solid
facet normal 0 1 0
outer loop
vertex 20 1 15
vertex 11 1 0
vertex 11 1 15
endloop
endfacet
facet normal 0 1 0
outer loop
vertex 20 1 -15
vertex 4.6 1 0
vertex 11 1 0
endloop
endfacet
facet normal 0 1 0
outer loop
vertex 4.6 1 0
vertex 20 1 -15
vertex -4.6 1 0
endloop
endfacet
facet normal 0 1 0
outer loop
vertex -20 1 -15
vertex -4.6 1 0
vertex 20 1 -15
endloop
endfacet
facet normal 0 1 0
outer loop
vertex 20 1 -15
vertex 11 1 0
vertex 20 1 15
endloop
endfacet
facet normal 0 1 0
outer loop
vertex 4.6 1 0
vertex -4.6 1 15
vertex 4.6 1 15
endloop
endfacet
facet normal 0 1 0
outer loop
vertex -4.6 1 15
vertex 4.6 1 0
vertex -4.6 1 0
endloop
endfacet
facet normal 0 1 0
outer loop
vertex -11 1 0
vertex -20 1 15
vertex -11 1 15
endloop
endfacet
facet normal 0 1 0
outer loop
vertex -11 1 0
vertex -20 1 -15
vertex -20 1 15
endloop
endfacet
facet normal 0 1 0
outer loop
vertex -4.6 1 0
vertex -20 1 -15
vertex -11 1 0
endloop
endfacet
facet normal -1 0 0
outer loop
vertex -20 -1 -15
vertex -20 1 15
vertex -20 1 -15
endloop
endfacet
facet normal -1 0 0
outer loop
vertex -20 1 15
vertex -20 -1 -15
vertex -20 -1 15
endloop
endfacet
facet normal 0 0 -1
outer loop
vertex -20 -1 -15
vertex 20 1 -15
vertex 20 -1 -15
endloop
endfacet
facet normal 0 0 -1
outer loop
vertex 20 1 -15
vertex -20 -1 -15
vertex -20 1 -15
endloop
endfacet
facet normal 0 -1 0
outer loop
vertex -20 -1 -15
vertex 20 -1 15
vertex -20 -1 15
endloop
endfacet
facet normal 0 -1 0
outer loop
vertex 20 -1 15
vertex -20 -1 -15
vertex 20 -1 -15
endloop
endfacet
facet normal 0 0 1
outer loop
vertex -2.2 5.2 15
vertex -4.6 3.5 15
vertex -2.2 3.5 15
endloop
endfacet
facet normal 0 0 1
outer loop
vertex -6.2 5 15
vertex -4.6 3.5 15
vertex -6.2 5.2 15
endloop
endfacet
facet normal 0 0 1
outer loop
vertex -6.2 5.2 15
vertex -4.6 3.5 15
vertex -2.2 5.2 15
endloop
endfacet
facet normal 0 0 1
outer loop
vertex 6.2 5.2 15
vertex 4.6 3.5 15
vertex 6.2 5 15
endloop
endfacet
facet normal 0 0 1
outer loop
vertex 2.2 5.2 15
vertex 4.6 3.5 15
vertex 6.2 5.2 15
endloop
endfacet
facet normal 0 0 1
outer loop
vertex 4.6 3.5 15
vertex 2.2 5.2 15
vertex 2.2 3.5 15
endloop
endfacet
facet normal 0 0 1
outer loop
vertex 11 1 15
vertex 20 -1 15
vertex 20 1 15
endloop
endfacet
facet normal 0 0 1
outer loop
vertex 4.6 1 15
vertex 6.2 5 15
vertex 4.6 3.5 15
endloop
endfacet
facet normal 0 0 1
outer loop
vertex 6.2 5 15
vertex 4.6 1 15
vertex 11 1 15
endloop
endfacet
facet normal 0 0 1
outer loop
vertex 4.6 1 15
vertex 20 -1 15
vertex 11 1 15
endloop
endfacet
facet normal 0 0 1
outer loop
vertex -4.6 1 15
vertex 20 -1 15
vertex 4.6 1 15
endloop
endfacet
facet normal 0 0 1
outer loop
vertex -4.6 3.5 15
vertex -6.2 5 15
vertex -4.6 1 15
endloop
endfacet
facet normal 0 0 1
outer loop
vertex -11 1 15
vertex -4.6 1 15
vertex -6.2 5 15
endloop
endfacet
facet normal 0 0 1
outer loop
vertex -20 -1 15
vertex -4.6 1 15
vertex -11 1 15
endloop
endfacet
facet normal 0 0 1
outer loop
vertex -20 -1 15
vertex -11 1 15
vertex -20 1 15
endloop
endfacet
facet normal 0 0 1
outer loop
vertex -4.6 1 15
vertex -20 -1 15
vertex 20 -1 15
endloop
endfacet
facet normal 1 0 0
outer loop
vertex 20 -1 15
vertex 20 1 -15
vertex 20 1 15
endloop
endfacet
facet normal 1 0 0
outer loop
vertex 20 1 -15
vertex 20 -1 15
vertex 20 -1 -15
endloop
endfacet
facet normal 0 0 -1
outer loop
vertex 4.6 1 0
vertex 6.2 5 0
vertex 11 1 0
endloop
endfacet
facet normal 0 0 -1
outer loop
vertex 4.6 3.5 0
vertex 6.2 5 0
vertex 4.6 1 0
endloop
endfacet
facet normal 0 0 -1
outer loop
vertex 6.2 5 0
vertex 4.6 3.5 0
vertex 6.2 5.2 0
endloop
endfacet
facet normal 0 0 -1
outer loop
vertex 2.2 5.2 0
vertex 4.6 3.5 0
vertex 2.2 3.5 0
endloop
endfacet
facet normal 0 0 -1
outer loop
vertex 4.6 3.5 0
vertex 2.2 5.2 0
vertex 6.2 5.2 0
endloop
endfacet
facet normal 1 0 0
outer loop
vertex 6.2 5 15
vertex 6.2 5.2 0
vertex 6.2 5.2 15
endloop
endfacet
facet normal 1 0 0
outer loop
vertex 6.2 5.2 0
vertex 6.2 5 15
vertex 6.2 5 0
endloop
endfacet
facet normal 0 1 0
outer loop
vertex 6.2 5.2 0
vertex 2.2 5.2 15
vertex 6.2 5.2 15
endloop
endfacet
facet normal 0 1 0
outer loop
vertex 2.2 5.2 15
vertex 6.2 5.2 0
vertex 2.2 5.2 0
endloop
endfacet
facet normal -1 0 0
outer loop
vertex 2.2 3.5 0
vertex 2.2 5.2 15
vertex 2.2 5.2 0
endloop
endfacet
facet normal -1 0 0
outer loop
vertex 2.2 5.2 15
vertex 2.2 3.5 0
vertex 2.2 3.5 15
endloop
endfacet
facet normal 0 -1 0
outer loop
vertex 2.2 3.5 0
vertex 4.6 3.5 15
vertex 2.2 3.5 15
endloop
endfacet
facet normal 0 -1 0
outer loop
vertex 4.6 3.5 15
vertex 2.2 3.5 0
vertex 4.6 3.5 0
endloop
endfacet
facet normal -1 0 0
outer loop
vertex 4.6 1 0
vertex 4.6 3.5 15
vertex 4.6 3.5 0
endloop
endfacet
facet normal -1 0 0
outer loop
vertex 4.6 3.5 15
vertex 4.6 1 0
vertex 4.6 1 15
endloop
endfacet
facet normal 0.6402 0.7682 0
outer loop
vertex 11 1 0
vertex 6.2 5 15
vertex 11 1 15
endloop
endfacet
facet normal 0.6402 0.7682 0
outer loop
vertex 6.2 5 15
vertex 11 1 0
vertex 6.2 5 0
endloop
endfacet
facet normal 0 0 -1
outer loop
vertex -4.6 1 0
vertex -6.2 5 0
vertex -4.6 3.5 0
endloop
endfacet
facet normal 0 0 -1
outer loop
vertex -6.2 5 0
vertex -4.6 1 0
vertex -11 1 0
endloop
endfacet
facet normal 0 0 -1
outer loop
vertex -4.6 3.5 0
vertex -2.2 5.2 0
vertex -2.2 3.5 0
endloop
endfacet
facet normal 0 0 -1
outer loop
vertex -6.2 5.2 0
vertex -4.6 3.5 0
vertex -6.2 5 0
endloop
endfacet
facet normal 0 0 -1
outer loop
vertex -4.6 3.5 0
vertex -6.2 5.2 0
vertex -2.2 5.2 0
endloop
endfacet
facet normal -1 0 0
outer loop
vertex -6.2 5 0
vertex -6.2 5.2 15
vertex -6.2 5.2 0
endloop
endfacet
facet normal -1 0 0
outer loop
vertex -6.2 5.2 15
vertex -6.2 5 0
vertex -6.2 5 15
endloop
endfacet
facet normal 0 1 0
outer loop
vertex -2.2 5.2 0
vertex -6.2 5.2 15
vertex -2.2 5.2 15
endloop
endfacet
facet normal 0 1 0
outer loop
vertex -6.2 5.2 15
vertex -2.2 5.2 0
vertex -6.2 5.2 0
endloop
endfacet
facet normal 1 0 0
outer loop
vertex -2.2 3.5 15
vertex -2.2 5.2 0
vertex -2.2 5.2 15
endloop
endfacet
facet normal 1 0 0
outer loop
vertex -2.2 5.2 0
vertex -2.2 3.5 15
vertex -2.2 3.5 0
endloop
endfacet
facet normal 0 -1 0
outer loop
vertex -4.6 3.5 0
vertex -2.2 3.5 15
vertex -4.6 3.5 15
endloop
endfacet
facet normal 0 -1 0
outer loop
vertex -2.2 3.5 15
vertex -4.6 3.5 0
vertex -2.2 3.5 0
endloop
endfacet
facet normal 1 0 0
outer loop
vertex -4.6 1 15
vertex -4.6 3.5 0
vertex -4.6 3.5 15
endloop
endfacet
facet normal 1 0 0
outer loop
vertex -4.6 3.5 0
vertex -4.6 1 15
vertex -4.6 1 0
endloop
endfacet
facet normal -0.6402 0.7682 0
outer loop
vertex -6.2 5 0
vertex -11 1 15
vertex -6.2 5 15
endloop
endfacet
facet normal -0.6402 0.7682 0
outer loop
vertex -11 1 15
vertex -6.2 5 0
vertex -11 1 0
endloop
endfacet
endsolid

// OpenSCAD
union(){
rotate([-90,0,0])
cube([40,30,2],center=true);
pest();
mirror([1,0,0])
pest();
}


module pest(){
linear_extrude(15)
polygon([[4.6,1],[4.6,3.5],[2.2,3.5], [2.2,5.2],[6.2,5.2],[6.2,5],[11,1]]);
}
